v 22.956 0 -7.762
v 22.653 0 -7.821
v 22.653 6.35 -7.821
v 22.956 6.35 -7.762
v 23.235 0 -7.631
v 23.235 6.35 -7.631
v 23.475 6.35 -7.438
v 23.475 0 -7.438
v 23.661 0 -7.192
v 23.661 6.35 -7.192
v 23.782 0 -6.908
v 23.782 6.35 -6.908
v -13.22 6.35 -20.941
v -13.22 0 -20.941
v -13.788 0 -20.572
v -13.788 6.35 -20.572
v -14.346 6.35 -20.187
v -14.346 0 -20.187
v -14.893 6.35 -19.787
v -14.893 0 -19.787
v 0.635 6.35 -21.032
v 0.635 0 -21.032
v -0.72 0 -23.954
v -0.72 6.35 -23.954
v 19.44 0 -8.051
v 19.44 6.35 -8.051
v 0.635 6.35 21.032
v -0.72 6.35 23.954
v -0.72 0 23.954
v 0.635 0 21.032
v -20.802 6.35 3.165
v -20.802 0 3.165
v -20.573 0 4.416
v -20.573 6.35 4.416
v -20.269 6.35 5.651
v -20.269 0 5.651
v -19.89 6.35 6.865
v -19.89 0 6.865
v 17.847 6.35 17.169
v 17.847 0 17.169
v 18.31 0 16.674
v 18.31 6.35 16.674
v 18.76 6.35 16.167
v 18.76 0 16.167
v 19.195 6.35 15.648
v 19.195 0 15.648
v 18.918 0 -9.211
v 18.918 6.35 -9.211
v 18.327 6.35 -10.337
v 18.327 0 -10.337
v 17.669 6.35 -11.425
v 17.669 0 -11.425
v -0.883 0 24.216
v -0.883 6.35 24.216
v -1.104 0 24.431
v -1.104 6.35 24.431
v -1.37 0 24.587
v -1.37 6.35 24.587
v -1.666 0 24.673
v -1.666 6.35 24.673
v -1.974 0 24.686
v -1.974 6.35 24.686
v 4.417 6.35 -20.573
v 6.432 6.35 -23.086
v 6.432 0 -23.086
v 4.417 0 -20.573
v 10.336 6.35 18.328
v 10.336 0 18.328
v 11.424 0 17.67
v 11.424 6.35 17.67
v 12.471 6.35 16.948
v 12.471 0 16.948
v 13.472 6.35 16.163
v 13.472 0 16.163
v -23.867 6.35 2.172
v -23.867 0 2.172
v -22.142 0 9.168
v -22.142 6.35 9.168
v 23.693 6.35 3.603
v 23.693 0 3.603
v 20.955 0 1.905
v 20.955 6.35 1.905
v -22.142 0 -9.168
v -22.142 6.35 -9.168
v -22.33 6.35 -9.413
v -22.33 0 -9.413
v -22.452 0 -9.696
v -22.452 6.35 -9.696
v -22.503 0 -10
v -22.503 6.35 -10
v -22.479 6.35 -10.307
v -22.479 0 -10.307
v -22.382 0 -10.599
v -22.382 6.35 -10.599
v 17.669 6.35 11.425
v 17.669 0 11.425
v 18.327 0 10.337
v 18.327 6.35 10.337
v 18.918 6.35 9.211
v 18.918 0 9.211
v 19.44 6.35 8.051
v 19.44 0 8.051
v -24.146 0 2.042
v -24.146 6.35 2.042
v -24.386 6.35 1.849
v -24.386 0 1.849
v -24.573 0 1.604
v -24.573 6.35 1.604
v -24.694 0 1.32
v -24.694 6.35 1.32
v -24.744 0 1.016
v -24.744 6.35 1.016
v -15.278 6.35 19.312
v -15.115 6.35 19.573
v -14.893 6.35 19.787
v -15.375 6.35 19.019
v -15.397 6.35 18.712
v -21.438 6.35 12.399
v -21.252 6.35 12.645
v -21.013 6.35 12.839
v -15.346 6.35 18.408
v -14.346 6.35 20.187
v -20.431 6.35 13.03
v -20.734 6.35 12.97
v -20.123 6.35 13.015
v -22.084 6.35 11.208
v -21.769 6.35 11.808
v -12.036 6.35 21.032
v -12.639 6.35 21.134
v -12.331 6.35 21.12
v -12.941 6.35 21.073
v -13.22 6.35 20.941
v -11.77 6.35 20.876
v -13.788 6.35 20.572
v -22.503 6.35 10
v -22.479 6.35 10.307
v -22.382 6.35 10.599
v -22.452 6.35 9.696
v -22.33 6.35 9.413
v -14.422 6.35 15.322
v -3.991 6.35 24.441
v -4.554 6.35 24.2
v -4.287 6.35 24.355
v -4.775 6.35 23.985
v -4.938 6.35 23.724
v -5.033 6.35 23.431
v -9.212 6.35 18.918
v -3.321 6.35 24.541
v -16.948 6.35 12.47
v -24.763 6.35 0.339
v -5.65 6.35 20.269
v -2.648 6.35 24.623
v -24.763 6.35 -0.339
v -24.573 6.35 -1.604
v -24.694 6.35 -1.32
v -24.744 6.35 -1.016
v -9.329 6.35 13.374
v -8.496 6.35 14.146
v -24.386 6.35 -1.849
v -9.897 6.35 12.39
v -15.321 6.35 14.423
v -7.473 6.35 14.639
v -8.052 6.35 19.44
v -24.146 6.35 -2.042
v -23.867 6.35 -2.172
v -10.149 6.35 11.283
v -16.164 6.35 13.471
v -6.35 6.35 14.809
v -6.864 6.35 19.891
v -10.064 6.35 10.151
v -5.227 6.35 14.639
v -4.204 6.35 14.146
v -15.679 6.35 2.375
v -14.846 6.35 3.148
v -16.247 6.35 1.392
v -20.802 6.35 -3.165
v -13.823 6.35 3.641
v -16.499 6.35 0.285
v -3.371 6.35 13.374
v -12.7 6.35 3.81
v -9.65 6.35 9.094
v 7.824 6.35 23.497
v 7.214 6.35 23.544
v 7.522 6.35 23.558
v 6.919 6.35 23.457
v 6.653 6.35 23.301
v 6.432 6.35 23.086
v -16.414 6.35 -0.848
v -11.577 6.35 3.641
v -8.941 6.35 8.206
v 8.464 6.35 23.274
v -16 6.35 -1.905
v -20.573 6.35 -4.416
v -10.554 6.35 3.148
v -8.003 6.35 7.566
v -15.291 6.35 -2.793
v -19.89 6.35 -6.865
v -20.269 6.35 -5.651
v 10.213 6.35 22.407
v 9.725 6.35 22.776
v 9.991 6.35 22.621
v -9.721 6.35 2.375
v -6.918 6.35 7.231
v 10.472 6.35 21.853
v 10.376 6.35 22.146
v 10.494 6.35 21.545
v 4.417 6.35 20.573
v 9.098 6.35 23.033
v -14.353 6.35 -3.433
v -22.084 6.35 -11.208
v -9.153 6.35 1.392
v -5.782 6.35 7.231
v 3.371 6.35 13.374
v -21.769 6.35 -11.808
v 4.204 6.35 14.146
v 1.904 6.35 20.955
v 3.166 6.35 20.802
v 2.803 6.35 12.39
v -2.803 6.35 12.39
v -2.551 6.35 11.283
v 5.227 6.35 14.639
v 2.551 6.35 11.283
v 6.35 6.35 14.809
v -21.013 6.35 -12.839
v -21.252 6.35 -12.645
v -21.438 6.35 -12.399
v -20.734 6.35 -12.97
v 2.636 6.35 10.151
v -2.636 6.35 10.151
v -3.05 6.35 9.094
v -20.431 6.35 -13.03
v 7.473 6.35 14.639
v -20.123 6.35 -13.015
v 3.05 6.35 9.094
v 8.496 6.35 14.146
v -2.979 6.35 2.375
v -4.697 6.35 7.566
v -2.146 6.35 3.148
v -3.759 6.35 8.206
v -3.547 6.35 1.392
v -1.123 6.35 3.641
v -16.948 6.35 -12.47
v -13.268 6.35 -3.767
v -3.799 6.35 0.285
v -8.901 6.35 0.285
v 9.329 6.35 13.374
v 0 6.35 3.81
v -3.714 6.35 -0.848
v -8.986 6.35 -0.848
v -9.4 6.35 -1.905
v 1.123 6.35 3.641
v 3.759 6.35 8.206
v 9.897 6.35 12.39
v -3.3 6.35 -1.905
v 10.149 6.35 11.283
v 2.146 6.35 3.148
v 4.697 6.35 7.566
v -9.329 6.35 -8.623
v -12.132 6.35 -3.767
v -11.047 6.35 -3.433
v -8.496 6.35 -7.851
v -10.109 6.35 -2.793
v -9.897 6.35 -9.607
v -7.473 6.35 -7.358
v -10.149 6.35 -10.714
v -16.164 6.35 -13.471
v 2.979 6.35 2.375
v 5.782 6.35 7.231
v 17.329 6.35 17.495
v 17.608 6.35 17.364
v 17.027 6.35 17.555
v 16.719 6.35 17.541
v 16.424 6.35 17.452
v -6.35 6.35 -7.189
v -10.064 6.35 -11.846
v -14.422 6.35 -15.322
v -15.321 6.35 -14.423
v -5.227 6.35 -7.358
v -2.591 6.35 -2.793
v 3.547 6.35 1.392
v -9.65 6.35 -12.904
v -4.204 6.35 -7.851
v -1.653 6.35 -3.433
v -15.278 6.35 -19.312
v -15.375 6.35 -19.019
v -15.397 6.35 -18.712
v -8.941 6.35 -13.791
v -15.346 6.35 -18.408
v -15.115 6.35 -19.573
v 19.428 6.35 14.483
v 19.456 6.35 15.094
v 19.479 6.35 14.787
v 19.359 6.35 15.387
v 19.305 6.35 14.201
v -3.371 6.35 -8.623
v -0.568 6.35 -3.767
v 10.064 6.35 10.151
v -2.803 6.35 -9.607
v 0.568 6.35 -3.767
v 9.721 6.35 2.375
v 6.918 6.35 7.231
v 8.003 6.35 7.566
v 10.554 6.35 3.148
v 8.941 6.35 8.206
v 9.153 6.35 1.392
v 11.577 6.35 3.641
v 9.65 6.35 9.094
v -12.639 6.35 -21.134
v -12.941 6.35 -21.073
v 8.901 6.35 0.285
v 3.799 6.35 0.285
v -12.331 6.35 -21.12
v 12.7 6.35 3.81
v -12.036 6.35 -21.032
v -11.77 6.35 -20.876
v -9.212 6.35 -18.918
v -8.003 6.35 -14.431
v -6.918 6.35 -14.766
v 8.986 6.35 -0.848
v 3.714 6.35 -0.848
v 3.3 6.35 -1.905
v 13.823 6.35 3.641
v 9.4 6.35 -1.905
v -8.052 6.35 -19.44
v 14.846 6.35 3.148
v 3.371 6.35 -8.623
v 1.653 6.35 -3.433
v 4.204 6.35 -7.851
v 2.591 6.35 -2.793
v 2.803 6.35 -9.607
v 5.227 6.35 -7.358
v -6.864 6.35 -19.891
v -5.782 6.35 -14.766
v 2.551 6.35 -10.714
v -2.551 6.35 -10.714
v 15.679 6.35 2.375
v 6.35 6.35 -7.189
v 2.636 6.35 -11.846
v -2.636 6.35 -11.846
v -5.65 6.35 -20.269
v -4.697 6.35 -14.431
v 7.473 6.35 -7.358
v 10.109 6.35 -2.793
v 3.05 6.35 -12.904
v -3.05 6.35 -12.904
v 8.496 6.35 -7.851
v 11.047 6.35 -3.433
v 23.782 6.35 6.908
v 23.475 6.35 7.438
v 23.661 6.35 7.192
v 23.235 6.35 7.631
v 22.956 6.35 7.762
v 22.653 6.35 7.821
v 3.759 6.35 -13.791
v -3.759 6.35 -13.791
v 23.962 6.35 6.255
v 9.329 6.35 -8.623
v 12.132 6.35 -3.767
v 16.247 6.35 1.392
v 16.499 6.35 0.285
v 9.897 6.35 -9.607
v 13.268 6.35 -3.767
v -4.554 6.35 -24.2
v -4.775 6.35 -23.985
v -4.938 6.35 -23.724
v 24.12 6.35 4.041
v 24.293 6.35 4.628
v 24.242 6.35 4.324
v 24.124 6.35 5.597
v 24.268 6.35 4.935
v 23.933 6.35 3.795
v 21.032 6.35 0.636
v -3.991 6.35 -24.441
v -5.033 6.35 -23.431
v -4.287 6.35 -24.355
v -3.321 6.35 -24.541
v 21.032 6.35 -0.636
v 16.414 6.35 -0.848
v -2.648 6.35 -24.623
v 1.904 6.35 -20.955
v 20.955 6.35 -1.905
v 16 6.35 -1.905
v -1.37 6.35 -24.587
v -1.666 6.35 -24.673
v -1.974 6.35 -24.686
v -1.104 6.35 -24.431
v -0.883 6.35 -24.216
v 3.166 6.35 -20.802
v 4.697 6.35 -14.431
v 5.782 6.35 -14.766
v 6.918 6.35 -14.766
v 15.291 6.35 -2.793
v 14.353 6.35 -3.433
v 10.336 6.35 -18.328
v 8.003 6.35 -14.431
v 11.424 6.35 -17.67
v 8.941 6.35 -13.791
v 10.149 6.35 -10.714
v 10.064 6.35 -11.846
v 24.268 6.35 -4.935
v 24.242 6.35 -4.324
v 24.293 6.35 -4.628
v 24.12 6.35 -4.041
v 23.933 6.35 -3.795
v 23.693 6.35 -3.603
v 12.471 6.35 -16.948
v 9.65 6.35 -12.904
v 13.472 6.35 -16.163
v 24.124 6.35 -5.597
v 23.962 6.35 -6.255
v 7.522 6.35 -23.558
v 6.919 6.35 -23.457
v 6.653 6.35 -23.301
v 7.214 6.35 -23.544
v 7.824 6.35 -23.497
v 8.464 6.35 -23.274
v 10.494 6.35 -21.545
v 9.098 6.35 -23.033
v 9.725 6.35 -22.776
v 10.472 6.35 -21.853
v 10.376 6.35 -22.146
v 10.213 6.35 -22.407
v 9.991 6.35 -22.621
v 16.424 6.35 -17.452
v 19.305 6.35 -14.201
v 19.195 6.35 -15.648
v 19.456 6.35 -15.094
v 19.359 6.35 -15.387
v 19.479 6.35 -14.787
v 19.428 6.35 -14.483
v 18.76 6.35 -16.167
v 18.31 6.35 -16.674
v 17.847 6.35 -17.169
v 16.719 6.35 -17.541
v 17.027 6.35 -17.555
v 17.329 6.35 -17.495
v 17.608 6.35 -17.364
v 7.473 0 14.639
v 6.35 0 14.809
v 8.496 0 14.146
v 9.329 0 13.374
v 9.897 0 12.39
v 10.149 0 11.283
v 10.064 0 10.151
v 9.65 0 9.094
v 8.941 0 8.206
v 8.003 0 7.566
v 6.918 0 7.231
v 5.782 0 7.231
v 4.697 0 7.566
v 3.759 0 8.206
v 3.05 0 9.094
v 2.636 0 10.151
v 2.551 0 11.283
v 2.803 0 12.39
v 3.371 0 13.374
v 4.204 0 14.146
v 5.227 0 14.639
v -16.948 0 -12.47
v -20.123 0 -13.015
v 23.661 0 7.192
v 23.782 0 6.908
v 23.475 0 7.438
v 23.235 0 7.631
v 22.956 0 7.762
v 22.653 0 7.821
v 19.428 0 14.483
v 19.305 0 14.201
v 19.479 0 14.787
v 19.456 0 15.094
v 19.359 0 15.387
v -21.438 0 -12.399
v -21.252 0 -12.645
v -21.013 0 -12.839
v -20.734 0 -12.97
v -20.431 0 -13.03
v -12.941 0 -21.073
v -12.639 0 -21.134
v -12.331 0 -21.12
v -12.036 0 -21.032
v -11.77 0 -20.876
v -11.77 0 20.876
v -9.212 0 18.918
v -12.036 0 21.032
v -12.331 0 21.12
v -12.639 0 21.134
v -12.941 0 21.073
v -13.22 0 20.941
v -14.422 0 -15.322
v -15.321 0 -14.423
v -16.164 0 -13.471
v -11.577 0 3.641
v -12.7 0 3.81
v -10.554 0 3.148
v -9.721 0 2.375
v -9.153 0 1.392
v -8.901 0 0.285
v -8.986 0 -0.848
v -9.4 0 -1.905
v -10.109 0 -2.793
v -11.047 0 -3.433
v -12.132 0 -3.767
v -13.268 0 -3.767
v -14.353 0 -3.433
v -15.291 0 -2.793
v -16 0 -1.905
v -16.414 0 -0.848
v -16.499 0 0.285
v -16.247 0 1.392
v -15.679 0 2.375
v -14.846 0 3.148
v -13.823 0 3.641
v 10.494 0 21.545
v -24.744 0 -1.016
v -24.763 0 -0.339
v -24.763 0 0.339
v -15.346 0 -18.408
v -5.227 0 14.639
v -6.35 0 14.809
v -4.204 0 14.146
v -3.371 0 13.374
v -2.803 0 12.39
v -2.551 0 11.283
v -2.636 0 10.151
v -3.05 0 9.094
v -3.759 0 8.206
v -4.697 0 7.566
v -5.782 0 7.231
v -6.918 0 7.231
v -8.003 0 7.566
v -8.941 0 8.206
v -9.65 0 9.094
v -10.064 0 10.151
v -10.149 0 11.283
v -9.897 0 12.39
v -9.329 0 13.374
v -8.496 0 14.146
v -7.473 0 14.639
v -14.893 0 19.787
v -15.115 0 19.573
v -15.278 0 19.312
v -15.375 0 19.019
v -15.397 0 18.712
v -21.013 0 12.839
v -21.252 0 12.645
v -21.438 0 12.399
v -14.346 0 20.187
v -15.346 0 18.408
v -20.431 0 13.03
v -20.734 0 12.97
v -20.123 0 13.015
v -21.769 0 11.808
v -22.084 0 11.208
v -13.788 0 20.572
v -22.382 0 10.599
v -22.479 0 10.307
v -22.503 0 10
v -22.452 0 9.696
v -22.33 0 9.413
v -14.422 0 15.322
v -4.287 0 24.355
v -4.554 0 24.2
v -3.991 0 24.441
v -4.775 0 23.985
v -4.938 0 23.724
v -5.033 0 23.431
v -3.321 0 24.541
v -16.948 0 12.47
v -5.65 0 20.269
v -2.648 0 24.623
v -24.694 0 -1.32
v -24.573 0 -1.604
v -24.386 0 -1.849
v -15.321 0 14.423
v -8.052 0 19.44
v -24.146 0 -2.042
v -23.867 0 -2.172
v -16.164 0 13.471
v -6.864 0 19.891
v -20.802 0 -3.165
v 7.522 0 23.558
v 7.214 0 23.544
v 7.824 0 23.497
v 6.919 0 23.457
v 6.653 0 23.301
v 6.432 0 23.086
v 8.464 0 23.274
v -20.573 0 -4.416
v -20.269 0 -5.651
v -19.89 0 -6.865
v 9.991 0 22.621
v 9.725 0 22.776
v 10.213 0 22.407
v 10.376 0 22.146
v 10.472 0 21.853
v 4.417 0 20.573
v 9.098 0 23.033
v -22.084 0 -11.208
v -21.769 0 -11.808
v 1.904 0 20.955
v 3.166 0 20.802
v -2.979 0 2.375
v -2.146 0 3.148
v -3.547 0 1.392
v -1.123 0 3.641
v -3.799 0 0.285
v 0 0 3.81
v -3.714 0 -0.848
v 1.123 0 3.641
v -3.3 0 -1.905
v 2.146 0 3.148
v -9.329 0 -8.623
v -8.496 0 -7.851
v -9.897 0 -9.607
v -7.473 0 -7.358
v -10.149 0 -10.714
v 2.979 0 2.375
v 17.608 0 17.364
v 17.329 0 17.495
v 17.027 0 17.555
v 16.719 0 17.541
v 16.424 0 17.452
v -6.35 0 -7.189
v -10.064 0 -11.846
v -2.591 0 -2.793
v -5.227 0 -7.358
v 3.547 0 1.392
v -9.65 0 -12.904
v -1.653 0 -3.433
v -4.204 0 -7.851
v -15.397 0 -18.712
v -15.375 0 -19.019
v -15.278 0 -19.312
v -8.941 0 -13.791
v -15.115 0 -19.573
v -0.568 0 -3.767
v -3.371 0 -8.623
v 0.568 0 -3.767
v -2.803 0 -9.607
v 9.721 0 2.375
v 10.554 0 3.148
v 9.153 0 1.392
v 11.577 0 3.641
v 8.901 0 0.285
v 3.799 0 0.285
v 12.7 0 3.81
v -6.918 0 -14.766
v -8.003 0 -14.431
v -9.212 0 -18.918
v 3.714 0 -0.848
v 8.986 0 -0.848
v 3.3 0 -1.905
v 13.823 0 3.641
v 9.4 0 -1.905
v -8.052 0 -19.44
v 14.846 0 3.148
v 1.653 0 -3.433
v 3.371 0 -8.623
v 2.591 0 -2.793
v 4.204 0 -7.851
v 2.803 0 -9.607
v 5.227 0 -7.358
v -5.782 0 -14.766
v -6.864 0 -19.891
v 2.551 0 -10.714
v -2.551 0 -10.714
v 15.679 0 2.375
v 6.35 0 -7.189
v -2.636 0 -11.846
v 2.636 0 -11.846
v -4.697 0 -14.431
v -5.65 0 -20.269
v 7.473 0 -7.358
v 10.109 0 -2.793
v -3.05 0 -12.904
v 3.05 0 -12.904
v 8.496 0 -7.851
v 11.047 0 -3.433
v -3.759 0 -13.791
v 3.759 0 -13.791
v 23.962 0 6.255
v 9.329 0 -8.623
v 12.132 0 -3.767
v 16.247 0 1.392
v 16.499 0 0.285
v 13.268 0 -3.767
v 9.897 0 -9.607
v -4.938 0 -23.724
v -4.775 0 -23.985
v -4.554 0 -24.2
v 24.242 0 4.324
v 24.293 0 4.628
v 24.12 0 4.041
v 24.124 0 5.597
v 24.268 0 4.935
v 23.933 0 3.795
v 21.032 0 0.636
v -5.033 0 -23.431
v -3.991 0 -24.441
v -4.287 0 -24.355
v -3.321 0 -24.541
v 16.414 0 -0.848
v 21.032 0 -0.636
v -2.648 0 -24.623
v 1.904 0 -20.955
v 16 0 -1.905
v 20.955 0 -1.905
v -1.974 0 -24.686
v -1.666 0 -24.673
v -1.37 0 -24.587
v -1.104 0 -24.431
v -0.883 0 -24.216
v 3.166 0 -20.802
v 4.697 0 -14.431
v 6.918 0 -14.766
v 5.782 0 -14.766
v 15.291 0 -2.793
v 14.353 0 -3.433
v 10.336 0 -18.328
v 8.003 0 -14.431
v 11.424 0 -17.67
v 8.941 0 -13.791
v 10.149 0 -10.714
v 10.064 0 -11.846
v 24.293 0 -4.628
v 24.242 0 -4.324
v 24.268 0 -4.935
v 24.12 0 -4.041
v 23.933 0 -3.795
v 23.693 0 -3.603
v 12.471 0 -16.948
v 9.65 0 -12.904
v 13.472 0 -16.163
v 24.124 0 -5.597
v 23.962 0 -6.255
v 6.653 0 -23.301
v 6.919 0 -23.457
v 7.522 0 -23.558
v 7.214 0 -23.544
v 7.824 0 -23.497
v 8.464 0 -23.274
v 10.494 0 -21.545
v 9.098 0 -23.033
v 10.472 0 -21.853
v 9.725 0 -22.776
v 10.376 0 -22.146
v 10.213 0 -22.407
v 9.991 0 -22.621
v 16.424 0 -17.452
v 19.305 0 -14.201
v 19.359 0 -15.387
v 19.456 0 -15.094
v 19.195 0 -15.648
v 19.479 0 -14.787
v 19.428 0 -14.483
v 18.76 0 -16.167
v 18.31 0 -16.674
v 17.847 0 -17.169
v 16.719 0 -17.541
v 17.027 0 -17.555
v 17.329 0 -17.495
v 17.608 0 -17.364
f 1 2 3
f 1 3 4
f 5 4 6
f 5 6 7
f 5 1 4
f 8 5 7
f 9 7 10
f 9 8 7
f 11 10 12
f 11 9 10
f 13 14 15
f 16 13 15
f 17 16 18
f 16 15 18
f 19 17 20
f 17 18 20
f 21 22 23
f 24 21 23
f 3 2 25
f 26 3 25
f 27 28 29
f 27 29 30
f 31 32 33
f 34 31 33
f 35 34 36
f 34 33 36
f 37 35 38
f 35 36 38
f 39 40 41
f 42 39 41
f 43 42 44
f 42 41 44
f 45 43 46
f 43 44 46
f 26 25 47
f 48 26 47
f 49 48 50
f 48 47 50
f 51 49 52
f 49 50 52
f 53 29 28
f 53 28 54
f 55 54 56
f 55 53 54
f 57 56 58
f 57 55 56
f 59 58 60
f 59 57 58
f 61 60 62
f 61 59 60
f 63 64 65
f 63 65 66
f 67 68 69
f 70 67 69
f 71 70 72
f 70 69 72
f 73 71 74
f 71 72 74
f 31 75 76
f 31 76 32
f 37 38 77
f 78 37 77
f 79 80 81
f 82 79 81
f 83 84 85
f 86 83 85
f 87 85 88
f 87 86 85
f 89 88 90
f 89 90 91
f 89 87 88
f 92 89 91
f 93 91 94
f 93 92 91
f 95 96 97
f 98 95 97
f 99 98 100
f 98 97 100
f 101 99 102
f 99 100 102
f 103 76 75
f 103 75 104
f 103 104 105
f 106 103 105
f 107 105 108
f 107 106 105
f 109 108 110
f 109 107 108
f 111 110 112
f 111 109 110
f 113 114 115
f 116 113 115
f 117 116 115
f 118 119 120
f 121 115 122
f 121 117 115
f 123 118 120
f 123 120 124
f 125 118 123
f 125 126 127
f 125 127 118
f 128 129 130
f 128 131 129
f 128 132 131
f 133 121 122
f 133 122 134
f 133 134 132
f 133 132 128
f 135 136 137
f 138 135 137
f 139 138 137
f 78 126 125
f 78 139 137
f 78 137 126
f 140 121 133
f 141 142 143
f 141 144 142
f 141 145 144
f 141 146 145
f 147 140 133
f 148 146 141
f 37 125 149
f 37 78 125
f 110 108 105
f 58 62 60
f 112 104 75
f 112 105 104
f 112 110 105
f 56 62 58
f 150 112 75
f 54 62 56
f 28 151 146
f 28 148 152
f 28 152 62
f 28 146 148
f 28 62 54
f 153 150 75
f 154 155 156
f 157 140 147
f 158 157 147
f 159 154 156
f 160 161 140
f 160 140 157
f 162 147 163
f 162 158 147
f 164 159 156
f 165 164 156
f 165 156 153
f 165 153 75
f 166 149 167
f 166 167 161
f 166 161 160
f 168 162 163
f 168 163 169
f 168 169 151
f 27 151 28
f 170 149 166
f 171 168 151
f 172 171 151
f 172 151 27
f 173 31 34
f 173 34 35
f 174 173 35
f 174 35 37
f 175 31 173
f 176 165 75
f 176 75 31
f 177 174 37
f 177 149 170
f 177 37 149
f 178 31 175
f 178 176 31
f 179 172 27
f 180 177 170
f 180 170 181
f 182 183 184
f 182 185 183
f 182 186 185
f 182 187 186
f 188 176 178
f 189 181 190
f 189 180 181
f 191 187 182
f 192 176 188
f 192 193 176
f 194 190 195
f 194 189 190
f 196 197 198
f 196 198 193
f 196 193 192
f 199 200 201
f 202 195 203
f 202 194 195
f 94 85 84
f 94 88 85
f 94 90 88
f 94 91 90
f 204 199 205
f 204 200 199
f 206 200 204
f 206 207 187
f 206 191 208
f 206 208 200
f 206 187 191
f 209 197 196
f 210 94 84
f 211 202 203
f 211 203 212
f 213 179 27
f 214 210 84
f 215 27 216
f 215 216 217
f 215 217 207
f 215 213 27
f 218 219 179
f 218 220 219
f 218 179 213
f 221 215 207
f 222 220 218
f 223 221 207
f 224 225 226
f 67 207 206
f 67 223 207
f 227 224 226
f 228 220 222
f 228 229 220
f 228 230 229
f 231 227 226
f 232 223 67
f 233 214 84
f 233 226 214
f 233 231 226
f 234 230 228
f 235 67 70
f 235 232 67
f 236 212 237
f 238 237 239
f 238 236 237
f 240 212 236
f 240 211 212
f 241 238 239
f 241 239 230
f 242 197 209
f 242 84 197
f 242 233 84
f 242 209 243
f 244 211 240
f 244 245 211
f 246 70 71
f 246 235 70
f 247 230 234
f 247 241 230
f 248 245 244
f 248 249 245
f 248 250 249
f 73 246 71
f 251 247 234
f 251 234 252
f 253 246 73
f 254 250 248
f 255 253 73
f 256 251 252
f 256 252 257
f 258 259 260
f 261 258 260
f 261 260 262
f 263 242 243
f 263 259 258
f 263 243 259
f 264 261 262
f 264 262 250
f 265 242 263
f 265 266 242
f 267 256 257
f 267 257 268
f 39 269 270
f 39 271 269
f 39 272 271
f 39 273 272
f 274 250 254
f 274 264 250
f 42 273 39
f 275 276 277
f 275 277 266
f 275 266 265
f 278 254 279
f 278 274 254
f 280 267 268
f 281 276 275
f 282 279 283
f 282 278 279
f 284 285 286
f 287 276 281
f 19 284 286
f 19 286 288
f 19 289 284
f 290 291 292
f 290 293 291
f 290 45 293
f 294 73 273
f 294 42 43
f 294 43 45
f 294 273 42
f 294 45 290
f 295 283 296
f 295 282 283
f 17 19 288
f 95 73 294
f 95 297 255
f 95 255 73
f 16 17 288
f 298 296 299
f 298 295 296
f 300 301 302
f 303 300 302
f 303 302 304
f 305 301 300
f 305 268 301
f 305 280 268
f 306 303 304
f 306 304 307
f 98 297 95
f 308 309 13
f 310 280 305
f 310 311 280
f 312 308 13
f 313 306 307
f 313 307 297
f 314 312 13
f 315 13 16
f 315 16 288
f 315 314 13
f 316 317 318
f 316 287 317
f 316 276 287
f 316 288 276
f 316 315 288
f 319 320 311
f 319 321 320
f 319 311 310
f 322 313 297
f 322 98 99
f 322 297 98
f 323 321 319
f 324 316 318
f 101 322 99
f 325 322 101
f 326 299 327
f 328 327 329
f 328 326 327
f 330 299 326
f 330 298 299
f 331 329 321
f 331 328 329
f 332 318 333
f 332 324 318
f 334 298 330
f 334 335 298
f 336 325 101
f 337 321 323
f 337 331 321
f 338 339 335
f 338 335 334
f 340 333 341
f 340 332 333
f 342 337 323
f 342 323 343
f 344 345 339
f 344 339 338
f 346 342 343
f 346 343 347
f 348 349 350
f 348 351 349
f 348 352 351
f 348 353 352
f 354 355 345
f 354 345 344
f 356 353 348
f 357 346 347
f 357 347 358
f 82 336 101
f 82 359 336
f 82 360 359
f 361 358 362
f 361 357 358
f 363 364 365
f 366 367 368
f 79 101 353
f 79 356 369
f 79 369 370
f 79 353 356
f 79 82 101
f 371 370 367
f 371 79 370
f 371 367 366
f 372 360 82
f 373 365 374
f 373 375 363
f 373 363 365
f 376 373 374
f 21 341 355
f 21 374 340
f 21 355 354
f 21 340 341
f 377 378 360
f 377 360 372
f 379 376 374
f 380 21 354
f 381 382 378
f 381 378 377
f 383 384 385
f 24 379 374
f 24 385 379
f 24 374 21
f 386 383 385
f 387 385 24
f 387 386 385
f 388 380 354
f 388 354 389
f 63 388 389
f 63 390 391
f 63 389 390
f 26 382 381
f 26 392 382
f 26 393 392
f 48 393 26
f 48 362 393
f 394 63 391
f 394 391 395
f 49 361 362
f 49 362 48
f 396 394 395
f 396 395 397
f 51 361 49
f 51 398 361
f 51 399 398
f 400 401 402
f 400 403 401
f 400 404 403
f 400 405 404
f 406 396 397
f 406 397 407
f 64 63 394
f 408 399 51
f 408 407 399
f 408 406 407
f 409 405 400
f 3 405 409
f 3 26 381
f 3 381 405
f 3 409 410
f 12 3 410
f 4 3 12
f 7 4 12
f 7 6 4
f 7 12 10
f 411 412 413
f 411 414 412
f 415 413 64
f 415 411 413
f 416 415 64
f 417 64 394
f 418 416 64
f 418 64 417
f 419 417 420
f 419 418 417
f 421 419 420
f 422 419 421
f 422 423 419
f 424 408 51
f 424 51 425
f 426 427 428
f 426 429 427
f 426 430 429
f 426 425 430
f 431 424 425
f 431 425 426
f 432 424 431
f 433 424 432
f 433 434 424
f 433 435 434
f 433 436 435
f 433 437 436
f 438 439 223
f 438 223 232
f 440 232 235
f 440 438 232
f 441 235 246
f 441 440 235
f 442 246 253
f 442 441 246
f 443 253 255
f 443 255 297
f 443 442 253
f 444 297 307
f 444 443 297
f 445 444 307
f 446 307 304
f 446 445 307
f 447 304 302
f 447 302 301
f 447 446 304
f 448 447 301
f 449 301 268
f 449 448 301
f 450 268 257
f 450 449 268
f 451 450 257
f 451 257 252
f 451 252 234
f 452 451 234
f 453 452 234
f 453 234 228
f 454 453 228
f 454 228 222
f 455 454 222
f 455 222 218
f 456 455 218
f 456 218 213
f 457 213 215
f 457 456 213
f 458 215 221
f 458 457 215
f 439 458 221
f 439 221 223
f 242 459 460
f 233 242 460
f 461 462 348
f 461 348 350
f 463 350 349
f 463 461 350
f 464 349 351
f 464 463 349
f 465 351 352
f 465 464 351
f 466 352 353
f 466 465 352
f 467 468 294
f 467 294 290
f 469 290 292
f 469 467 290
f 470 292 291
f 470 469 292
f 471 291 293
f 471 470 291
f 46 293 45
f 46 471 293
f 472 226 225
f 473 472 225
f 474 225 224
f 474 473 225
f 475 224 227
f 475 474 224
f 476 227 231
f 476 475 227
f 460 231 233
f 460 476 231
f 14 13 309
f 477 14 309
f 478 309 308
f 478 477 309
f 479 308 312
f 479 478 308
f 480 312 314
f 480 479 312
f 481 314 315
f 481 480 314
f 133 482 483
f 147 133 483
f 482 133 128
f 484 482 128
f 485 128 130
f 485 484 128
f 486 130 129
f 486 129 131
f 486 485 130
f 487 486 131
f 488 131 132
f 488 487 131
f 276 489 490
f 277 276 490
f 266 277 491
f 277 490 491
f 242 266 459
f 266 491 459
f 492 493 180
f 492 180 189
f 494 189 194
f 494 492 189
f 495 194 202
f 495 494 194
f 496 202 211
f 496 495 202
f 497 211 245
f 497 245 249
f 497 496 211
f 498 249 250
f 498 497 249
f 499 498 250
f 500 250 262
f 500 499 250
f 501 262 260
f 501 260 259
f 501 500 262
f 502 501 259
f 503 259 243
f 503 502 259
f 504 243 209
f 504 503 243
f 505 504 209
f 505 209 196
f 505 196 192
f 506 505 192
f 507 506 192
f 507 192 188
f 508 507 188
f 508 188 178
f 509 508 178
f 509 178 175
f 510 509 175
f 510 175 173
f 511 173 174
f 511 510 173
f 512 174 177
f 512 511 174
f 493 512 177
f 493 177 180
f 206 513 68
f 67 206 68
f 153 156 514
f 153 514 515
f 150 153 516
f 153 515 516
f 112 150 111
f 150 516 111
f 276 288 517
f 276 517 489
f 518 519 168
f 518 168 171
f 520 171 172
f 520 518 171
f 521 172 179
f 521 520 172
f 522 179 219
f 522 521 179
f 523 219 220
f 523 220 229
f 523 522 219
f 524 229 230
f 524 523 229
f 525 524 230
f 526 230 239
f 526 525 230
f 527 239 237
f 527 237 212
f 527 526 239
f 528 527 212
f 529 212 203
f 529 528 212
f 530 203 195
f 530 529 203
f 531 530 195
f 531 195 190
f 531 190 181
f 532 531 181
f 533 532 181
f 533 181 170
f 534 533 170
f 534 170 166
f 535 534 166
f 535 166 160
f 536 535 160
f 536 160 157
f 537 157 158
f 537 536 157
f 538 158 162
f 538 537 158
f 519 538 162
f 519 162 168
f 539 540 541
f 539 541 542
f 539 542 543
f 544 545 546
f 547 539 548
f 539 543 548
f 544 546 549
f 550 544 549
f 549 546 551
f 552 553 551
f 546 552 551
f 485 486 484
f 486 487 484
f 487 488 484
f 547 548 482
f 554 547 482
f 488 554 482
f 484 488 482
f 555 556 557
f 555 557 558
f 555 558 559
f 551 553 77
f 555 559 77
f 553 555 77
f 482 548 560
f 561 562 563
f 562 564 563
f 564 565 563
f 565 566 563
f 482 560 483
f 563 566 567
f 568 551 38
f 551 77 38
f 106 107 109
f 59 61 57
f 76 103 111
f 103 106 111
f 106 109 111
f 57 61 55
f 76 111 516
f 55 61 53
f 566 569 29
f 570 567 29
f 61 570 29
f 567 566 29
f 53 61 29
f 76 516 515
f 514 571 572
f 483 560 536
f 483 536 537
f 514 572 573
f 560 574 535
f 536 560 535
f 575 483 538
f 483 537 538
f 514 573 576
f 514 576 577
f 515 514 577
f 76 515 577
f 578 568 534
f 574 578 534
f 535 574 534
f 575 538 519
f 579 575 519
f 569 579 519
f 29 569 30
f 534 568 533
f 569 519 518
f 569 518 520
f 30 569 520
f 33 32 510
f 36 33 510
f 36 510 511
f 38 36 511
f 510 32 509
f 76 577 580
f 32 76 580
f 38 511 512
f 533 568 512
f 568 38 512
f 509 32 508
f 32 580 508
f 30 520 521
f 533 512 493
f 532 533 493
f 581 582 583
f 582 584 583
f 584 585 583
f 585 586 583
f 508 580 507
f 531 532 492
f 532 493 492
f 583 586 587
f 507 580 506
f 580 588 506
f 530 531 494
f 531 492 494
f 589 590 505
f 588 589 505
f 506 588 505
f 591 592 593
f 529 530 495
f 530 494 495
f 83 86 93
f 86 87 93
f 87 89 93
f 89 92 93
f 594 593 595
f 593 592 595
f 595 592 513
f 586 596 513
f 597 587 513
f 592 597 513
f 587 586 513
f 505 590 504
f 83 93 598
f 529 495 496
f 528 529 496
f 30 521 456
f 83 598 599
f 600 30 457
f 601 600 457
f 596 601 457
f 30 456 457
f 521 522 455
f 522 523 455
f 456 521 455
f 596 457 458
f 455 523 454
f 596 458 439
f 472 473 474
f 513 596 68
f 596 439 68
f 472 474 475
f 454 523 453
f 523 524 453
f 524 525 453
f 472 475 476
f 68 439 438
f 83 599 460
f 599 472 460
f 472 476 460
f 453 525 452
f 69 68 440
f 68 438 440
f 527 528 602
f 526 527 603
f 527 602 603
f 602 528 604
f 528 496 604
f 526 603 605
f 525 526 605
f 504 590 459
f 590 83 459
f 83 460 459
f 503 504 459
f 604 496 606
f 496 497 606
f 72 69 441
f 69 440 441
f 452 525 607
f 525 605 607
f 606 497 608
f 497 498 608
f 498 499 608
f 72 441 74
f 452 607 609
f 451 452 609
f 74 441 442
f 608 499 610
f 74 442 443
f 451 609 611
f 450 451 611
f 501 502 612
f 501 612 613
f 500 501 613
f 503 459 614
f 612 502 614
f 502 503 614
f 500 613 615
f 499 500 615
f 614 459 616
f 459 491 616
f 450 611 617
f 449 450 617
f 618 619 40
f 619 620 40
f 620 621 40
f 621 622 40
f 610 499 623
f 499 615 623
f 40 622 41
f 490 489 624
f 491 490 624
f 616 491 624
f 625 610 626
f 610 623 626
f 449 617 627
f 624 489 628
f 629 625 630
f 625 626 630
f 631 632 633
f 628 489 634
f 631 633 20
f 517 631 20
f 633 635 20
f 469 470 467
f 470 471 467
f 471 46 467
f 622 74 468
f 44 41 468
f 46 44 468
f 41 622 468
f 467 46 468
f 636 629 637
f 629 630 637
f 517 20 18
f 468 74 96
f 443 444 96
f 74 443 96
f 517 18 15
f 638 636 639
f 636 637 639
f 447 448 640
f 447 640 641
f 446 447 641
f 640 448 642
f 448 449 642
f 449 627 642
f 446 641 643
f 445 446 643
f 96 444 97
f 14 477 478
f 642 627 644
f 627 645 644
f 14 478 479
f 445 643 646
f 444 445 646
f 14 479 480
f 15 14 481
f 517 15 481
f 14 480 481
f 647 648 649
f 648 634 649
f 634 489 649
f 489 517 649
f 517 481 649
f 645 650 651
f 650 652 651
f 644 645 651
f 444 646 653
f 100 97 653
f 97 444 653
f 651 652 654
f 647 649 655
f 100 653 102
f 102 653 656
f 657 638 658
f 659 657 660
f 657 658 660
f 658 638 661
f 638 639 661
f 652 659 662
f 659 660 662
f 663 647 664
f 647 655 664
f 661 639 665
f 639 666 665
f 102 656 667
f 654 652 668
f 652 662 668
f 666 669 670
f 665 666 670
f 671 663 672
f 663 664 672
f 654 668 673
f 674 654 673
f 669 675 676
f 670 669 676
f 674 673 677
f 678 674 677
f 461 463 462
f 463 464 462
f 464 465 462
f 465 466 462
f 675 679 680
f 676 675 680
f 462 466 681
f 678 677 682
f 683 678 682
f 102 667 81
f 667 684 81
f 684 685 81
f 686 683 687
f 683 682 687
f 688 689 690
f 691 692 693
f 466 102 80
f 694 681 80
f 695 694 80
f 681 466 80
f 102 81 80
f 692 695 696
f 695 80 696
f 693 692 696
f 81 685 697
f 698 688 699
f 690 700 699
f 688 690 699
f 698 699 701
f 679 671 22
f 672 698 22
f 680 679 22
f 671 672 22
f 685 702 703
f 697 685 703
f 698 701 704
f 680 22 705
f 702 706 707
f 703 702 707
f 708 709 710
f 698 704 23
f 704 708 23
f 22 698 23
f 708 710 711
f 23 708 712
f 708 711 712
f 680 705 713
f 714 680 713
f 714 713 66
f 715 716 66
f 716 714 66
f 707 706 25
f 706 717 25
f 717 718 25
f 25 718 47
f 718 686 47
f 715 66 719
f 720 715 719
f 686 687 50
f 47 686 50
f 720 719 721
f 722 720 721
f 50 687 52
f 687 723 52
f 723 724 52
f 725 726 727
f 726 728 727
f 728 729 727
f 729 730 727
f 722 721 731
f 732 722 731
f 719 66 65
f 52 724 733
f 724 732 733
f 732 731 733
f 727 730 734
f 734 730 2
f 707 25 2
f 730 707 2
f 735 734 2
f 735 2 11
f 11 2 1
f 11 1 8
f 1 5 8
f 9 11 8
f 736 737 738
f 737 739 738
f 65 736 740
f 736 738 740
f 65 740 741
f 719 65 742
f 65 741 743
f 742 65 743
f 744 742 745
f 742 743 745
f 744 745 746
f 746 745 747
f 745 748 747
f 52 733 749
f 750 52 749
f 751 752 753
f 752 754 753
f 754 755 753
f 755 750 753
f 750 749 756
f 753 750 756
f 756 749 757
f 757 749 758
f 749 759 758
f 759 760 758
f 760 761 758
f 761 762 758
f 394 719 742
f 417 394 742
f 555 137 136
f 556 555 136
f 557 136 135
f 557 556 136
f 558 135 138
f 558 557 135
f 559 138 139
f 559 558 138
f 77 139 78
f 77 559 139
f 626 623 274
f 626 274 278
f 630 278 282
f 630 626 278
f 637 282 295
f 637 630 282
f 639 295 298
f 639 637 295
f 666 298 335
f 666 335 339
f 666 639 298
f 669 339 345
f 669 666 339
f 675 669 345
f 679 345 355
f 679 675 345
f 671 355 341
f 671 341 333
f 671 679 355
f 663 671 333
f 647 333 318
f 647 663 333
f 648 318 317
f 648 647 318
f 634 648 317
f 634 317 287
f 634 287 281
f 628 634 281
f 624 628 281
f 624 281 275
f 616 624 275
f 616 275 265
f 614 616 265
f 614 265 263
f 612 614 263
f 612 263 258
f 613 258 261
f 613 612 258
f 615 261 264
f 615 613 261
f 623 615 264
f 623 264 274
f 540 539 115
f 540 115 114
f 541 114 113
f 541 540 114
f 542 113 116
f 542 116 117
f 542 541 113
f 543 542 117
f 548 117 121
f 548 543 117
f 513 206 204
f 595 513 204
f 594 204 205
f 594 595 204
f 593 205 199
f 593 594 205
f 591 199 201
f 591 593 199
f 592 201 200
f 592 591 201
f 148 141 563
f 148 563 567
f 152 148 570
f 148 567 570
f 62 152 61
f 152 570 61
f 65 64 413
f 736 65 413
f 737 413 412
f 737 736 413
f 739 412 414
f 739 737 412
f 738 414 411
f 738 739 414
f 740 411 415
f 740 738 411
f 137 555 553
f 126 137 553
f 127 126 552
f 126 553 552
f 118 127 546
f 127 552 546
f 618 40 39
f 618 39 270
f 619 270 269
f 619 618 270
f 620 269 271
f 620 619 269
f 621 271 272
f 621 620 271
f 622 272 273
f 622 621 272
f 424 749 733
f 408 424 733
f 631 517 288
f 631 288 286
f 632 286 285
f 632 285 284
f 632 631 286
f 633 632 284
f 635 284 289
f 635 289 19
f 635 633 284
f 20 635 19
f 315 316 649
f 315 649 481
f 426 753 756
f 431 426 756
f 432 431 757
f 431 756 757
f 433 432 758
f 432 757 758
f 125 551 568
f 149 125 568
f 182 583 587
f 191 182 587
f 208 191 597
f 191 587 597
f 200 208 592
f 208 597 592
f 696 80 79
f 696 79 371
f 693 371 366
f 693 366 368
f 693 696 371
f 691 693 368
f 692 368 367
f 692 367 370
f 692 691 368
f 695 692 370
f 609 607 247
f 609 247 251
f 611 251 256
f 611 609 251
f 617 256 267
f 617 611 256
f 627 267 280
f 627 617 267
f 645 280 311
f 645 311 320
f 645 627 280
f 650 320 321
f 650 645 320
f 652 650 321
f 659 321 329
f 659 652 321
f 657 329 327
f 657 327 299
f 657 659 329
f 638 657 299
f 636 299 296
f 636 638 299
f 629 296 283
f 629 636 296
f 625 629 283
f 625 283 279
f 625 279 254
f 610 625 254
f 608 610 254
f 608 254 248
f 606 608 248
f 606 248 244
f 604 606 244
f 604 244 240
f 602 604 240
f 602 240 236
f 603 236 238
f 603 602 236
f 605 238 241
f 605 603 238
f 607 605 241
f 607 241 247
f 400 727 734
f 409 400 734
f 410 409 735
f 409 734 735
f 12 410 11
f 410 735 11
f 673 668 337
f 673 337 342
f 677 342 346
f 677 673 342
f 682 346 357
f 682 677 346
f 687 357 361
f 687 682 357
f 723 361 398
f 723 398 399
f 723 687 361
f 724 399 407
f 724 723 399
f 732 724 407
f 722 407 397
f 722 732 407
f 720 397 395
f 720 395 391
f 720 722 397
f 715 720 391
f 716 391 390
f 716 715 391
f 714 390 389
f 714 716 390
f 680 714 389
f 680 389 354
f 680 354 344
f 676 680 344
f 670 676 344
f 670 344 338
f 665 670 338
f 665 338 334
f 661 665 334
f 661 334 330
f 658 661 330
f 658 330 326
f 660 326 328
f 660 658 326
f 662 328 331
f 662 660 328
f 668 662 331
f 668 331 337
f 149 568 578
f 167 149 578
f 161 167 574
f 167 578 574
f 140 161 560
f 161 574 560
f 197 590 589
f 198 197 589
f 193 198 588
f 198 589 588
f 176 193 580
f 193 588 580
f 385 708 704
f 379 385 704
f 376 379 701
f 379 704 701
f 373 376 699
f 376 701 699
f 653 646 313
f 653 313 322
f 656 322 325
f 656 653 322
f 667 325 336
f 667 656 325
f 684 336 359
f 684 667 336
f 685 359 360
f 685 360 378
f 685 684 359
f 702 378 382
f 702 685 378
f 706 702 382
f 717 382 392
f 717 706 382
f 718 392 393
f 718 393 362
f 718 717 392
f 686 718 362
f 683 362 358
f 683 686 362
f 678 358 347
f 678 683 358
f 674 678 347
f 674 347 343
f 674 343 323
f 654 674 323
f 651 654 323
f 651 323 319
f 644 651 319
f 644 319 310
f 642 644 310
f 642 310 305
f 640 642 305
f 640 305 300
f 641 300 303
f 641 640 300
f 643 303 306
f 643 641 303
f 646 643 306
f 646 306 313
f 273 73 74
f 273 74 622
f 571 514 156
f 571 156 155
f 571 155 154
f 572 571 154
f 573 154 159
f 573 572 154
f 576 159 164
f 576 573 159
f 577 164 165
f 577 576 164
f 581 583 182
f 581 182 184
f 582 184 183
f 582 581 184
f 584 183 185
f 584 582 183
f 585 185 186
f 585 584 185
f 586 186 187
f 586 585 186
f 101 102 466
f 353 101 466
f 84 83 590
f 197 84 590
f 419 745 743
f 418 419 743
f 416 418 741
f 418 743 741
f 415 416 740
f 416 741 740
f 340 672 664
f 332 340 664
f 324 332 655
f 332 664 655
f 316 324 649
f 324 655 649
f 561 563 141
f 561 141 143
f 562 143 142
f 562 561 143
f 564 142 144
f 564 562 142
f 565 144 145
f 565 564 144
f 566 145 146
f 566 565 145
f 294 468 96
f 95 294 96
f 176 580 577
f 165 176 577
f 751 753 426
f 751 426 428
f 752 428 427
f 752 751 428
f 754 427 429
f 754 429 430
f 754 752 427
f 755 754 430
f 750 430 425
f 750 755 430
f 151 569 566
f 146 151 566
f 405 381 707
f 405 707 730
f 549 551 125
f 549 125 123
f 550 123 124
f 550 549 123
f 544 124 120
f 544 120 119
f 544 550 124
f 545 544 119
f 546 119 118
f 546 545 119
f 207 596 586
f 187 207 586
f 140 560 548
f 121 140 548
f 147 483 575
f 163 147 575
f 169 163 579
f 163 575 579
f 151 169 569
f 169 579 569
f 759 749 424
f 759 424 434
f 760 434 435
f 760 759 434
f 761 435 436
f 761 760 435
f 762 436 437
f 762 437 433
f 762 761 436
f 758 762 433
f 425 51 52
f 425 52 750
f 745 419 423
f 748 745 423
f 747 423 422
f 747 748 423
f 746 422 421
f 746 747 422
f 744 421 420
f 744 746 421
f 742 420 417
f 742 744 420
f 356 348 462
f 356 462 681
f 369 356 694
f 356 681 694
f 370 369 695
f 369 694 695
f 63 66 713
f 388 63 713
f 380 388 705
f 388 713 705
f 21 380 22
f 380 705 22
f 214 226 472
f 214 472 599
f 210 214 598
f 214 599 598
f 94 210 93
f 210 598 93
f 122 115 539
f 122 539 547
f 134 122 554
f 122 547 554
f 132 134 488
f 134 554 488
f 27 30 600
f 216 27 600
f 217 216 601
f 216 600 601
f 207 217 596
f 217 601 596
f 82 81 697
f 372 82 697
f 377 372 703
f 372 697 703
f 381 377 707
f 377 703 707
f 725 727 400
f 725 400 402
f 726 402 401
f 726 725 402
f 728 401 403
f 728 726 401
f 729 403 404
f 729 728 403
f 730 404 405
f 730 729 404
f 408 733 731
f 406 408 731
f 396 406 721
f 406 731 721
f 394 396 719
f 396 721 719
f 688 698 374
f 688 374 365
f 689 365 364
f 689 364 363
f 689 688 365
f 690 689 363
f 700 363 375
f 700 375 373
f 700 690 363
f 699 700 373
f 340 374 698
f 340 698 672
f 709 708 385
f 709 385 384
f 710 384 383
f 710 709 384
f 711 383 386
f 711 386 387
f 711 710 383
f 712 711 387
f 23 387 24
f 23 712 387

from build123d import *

# Parameters (mm, degrees)
TOOTH_DEPTH       = 6.35
CIRPATTERN2_COUNT = 13
FILLET1_START     = -1
FILLET1_DEPTH     = 8
CIRPATTERN4_COUNT = 13
BEARING_START     = -6.35
SKETCH2_R         = 17.145
SKETCH2_R_2       = 3.81
BEARING_DEPTH     = 6.35


with BuildPart() as part:
    # Sketch1 → tooth (new body)
    with BuildSketch(Plane(origin=(0, 0, 0), x_dir=(1, 0, 0), z_dir=(0, 1, 0))):
        with BuildLine():
            Line((20.955, 1.905), (24.430024666, 4.059448215))
            ThreePointArc((24.430024666, 4.059448215), (24.045374001, 5.92665286), (23.518231918, 7.758736523))
            Line((23.518231918, 7.758736523), (16.281852867, 5.371432977))
            ThreePointArc((16.281852867, 5.371432977), (17.094199899, 1.318846017), (16.913093955, -2.810387497))
            Line((16.913093955, -2.810387497), (24.430024666, -4.059448215))
            Line((24.430024666, -4.059448215), (20.955, -1.905))
            ThreePointArc((20.955, -1.905), (21.041412738, 0), (20.955, 1.905))
        make_face()
    tooth = extrude(amount=TOOTH_DEPTH)

    # CirPattern2: tooth ×13 about axis
    cirpattern2_axis = Axis((0, 0, 0), (0, 1, 0))
    for i in range(1, CIRPATTERN2_COUNT):
        add(tooth.rotate(cirpattern2_axis, i * 360 / CIRPATTERN2_COUNT))

    # Fillet1: read off the stored shape, not the designer's step
    # Fillet1 outline → Fillet1 (cut)
    with BuildSketch(Plane(origin=(0, 0, 0), x_dir=(1, 0, 0), z_dir=(0, 1, 0)).offset(FILLET1_START)):
        with BuildLine():
            Line((23.518231918, 7.758736523), (22.653265955, 7.820825329))
            ThreePointArc((22.653265955, 7.820825329), (23.360778925, 7.541702395), (23.781921552, 6.908359594))
            ThreePointArc((23.781921552, 6.908359594), (23.653898512, 7.334733136), (23.518231918, 7.758736523))
        make_face()
        with BuildLine():
            ThreePointArc((24.430024666, 4.059448215), (24.353107335, 4.497931535), (24.268320524, 4.934961391))
            ThreePointArc((24.268320524, 4.934961391), (24.189746323, 4.178449454), (23.692989596, 3.602500698))
            Line((23.692989596, 3.602500698), (24.430024666, 4.059448215))
        make_face()
    fillet1 = extrude(amount=FILLET1_DEPTH, mode=Mode.SUBTRACT)

    # CirPattern4: Fillet1 ×13 about axis
    cirpattern4_axis = Axis((0, 0, 0), (0, 1, 0))
    for i in range(1, CIRPATTERN4_COUNT):
        add(fillet1.rotate(cirpattern4_axis, i * 360 / CIRPATTERN4_COUNT), mode=Mode.SUBTRACT)

    # Sketch2 → bearing (add)
    with BuildSketch(Plane(origin=(0, 6.35, 0), x_dir=(1, 0, 0), z_dir=(0, 1, 0)).offset(BEARING_START)):
        Circle(SKETCH2_R)
        with Locations(Location((0, 0, 0), (0, 0, 270))):
            Circle(SKETCH2_R_2, mode=Mode.SUBTRACT)
        with Locations(Location((12.7, 0, 0), (0, 0, 270))):
            Circle(SKETCH2_R_2, mode=Mode.SUBTRACT)
        with Locations(Location((6.35, -10.998522628, 0), (0, 0, 270))):
            Circle(SKETCH2_R_2, mode=Mode.SUBTRACT)
        with Locations(Location((-6.35, -10.998522628, 0), (0, 0, 270))):
            Circle(SKETCH2_R_2, mode=Mode.SUBTRACT)
        with Locations(Location((-12.7, 0, 0), (0, 0, 270))):
            Circle(SKETCH2_R_2, mode=Mode.SUBTRACT)
        with Locations(Location((-6.35, 10.998522628, 0), (0, 0, 270))):
            Circle(SKETCH2_R_2, mode=Mode.SUBTRACT)
        with Locations(Location((6.35, 10.998522628, 0), (0, 0, 270))):
            Circle(SKETCH2_R_2, mode=Mode.SUBTRACT)
    extrude(amount=BEARING_DEPTH)


solid = part.part
